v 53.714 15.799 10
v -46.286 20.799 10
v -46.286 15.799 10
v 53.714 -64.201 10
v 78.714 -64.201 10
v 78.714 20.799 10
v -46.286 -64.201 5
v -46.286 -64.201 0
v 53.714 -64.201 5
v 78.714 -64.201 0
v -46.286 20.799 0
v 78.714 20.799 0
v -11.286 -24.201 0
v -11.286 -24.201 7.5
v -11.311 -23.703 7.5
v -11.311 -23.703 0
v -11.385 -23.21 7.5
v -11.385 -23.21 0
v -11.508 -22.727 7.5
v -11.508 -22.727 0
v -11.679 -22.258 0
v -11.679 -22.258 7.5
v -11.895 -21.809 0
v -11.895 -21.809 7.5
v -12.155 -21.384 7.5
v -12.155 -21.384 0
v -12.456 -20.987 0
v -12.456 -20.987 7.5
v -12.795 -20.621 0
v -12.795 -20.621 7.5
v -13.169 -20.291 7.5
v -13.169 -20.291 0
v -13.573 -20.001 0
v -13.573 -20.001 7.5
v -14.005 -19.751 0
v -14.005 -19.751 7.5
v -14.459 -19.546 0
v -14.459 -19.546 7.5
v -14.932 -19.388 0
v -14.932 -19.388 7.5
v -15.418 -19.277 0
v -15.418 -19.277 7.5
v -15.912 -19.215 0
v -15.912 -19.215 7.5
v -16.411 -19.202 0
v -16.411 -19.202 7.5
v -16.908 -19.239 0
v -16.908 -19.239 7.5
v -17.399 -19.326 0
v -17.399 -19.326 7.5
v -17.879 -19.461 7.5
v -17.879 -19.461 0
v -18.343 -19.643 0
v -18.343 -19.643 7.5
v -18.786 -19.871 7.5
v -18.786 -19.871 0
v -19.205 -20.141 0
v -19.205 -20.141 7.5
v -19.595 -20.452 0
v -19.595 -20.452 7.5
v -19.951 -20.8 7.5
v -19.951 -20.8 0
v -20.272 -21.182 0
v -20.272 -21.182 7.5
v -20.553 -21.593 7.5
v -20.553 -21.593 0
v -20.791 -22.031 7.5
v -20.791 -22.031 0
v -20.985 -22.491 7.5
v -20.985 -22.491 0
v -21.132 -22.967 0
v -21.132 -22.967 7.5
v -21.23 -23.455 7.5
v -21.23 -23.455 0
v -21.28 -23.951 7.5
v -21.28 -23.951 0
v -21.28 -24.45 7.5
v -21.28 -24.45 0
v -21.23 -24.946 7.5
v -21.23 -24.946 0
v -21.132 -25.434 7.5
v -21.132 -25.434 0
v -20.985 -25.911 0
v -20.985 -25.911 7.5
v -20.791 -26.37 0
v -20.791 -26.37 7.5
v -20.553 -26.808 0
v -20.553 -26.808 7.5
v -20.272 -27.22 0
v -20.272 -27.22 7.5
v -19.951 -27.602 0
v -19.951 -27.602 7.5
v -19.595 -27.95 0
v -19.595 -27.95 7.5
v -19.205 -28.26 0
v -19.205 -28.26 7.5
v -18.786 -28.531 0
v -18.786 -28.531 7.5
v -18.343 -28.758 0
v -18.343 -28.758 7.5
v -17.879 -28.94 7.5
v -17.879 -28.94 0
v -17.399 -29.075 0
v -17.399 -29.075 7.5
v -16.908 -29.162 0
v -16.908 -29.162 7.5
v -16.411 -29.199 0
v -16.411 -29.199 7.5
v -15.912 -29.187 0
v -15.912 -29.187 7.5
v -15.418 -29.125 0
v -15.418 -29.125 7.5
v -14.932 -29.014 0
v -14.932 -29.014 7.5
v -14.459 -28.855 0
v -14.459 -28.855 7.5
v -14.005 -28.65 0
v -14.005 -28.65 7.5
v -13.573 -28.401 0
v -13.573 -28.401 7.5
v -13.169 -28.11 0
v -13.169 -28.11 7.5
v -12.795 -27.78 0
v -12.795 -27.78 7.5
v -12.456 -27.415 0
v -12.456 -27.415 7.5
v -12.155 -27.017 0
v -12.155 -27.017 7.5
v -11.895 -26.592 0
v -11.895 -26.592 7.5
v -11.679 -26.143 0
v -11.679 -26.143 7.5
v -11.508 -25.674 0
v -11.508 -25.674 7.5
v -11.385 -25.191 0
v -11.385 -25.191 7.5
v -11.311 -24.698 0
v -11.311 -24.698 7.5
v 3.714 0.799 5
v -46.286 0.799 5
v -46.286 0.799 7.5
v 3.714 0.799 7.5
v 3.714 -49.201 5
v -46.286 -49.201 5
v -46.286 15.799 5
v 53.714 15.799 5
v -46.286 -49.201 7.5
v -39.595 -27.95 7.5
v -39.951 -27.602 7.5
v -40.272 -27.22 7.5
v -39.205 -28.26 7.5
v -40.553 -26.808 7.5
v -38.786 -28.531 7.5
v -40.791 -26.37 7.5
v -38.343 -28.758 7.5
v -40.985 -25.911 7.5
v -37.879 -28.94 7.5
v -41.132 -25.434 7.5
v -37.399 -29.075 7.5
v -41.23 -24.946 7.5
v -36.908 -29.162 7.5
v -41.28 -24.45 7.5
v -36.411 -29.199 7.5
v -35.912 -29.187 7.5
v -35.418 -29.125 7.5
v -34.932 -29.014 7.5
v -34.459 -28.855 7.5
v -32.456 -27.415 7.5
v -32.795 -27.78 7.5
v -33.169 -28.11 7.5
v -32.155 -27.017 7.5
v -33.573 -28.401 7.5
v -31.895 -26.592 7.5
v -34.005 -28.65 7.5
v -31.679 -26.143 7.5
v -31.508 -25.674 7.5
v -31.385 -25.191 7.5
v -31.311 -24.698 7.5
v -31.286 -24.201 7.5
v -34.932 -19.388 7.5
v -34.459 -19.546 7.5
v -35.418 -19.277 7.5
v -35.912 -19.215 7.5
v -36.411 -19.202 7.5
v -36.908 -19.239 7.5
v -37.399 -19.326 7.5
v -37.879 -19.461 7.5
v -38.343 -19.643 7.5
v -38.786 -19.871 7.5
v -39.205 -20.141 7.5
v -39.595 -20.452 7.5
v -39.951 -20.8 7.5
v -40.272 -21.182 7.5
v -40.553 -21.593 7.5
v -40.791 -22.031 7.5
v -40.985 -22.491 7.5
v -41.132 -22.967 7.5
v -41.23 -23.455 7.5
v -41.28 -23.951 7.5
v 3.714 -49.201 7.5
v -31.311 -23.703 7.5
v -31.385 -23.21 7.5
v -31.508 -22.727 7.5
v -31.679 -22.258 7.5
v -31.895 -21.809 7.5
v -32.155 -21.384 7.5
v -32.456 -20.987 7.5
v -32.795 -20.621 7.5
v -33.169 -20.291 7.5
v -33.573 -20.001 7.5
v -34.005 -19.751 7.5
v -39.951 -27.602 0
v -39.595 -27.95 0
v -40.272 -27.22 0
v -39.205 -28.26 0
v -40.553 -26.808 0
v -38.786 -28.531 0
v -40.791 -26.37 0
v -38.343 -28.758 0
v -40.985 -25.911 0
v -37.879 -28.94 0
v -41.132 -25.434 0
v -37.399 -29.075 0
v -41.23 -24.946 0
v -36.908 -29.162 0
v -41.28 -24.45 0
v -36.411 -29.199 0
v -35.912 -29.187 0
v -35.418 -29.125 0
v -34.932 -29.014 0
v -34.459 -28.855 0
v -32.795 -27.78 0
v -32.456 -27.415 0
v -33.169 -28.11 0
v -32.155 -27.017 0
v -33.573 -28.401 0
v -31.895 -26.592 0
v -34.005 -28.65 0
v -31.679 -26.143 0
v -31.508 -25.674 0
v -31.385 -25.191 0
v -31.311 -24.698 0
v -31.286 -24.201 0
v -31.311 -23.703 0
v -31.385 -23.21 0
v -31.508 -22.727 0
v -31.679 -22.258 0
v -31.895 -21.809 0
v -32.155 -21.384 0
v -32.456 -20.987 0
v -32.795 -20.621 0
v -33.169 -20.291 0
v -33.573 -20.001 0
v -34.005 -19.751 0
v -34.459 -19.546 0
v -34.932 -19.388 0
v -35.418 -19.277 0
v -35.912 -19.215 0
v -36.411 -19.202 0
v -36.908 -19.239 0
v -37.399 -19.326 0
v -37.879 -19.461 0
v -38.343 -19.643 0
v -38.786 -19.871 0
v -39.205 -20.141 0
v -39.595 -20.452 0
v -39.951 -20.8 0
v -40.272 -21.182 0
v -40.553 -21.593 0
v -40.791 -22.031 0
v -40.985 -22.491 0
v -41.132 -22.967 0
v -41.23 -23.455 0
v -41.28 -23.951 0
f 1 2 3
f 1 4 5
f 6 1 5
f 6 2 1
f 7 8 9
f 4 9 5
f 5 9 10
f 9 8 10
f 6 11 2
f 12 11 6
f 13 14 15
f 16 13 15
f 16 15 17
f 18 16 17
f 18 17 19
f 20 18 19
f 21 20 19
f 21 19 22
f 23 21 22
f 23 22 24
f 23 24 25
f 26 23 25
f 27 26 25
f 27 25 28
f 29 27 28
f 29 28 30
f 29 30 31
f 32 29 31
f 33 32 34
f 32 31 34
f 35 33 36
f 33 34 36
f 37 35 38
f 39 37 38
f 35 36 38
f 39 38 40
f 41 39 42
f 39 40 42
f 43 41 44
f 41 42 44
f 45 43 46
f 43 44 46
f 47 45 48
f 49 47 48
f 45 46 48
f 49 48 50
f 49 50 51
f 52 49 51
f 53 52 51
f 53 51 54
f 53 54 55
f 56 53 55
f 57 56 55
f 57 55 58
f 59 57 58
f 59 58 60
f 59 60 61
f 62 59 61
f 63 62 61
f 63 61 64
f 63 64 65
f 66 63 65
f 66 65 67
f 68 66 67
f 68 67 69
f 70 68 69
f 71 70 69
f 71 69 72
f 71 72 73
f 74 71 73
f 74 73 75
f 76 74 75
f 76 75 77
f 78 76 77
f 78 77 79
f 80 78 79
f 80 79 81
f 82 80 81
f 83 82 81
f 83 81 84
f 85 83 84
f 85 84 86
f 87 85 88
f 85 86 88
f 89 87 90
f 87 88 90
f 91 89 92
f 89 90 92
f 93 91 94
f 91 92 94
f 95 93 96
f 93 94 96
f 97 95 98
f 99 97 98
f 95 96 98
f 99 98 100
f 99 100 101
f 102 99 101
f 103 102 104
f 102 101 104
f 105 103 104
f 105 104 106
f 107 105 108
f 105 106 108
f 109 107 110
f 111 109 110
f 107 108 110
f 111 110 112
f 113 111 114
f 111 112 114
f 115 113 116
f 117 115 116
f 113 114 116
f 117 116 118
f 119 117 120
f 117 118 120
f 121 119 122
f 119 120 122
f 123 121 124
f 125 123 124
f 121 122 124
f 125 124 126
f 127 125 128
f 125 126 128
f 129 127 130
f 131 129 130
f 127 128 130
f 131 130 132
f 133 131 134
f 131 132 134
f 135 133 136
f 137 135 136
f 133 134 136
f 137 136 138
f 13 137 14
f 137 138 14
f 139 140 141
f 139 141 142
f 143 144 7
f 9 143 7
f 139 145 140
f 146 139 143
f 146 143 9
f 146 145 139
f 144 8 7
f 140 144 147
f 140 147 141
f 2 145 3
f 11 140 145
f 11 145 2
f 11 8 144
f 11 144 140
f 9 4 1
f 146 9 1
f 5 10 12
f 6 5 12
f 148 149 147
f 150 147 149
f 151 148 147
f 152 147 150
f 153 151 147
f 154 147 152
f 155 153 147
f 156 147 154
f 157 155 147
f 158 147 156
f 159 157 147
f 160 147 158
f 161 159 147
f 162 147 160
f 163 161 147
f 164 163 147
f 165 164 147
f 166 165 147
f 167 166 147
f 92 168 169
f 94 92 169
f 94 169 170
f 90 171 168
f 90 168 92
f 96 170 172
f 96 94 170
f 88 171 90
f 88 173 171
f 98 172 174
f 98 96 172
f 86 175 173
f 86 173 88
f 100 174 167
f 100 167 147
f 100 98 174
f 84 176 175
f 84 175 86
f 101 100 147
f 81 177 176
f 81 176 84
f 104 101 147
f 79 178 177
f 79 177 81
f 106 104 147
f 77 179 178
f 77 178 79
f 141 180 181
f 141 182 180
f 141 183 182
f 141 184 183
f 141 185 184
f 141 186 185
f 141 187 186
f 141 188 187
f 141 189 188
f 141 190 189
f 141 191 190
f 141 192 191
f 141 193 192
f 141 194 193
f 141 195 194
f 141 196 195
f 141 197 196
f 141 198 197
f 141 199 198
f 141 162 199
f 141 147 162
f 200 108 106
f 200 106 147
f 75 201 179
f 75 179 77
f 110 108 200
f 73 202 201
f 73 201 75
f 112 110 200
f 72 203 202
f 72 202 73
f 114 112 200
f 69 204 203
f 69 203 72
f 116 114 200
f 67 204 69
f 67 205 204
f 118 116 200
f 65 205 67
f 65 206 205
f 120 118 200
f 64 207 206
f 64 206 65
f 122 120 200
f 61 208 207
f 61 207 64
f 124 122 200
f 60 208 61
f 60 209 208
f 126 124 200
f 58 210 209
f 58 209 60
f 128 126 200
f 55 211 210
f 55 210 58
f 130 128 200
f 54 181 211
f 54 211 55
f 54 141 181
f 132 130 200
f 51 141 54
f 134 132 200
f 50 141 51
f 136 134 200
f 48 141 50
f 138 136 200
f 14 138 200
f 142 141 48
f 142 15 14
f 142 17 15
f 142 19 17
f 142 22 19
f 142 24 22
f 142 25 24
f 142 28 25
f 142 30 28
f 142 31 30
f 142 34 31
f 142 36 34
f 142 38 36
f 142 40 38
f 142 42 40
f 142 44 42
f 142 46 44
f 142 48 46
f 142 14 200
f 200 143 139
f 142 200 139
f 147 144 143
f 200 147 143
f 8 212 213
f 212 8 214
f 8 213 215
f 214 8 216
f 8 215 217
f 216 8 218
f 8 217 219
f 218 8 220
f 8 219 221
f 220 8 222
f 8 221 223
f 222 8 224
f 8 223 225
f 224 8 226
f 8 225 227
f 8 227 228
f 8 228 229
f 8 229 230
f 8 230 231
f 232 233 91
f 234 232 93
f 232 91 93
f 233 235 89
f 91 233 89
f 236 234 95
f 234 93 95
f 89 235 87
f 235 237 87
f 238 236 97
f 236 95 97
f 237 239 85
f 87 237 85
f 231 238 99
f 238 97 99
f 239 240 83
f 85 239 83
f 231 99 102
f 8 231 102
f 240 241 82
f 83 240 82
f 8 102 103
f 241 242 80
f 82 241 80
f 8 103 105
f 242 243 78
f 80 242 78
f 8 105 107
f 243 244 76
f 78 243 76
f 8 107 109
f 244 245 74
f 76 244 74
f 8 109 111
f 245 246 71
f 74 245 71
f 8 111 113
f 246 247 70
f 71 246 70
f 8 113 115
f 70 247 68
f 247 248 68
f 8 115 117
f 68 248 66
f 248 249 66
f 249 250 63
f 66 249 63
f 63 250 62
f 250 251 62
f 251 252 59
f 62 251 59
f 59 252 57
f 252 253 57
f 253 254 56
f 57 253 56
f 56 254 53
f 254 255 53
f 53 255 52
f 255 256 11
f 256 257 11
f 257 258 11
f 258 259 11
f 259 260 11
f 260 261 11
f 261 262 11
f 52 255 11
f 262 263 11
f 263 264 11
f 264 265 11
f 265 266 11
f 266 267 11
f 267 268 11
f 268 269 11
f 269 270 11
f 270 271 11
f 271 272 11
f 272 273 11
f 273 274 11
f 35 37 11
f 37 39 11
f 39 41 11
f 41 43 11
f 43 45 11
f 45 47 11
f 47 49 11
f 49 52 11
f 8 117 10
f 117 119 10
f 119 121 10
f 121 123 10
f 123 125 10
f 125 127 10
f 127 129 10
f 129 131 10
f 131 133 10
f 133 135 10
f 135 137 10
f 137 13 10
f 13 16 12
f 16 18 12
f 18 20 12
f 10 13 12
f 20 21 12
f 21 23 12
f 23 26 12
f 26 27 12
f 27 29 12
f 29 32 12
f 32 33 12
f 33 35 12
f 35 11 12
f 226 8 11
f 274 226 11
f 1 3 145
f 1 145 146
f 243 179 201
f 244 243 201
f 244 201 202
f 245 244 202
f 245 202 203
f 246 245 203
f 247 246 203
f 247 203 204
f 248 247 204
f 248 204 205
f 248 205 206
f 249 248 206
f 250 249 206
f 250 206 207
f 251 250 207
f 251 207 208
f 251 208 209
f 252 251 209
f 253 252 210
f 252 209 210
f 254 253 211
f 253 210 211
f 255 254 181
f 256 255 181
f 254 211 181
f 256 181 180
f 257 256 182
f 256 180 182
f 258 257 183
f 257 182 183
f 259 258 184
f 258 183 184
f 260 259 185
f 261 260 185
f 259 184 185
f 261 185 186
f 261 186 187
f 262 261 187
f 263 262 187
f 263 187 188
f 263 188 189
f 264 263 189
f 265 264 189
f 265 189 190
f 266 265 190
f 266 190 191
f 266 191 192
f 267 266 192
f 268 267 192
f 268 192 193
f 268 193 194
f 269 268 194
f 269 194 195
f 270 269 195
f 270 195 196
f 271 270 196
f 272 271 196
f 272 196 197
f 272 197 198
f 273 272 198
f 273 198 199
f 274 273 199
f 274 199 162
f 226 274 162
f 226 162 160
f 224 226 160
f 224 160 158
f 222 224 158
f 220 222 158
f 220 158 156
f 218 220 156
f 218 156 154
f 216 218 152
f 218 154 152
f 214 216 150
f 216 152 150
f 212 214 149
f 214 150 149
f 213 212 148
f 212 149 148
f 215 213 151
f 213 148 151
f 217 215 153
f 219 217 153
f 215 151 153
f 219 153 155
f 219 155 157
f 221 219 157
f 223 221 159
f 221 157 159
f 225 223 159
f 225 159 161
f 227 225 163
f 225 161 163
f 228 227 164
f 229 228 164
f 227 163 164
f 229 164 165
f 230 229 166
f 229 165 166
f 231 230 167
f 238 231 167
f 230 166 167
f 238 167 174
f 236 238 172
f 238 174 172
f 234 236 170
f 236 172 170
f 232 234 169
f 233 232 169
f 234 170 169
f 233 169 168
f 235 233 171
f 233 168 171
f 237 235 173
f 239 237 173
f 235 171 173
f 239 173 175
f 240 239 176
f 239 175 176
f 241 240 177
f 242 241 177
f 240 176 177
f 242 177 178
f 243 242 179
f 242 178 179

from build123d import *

# Parameters (mm, degrees)
SKIZZE1_W                       = 125
SKIZZE1_H                       = 85
AUFSATZ_LINEAR_AUSTRAGEN1_DEPTH = 10
SKIZZE2_W                       = 100
SKIZZE2_H                       = 80
SCHNITT_LINEAR_AUSTRAGEN1_DEPTH = 5
SKIZZE3_W                       = 50
SKIZZE3_H                       = 50
AUFSATZ_LINEAR_AUSTRAGEN2_DEPTH = 2.5
SKIZZE4_R                       = 5
SCHNITT_LINEAR_AUSTRAGEN2_DEPTH = 22.5


with BuildPart() as part:
    # Skizze1 → Aufsatz-Linear austragen1 (new body)
    with BuildSketch(Plane.XY):
        with Locations((16.213851874, -21.700636943)):
            Rectangle(SKIZZE1_W, SKIZZE1_H)
    extrude(amount=AUFSATZ_LINEAR_AUSTRAGEN1_DEPTH)

    # Skizze2 → Schnitt-Linear austragen1 (cut)
    with BuildSketch(Plane.XY.offset(10)):
        with Locations((3.713851874, -24.200636943)):
            Rectangle(SKIZZE2_W, SKIZZE2_H)
    extrude(amount=-SCHNITT_LINEAR_AUSTRAGEN1_DEPTH, mode=Mode.SUBTRACT)

    # Skizze3 → Aufsatz-Linear austragen2 (add)
    with BuildSketch(Plane.XY.offset(5)):
        with Locations((-21.286148126, -24.200636943)):
            Rectangle(SKIZZE3_W, SKIZZE3_H)
    extrude(amount=AUFSATZ_LINEAR_AUSTRAGEN2_DEPTH)

    # Skizze4 → Schnitt-Linear austragen2 (cut)
    with BuildSketch(Plane.XY.offset(7.5)):
        with Locations((-36.286148126, -24.200636943)):
            Circle(SKIZZE4_R)
        with Locations((-16.286148126, -24.200636943)):
            Circle(SKIZZE4_R)
    extrude(amount=-SCHNITT_LINEAR_AUSTRAGEN2_DEPTH, mode=Mode.SUBTRACT)


solid = part.part
